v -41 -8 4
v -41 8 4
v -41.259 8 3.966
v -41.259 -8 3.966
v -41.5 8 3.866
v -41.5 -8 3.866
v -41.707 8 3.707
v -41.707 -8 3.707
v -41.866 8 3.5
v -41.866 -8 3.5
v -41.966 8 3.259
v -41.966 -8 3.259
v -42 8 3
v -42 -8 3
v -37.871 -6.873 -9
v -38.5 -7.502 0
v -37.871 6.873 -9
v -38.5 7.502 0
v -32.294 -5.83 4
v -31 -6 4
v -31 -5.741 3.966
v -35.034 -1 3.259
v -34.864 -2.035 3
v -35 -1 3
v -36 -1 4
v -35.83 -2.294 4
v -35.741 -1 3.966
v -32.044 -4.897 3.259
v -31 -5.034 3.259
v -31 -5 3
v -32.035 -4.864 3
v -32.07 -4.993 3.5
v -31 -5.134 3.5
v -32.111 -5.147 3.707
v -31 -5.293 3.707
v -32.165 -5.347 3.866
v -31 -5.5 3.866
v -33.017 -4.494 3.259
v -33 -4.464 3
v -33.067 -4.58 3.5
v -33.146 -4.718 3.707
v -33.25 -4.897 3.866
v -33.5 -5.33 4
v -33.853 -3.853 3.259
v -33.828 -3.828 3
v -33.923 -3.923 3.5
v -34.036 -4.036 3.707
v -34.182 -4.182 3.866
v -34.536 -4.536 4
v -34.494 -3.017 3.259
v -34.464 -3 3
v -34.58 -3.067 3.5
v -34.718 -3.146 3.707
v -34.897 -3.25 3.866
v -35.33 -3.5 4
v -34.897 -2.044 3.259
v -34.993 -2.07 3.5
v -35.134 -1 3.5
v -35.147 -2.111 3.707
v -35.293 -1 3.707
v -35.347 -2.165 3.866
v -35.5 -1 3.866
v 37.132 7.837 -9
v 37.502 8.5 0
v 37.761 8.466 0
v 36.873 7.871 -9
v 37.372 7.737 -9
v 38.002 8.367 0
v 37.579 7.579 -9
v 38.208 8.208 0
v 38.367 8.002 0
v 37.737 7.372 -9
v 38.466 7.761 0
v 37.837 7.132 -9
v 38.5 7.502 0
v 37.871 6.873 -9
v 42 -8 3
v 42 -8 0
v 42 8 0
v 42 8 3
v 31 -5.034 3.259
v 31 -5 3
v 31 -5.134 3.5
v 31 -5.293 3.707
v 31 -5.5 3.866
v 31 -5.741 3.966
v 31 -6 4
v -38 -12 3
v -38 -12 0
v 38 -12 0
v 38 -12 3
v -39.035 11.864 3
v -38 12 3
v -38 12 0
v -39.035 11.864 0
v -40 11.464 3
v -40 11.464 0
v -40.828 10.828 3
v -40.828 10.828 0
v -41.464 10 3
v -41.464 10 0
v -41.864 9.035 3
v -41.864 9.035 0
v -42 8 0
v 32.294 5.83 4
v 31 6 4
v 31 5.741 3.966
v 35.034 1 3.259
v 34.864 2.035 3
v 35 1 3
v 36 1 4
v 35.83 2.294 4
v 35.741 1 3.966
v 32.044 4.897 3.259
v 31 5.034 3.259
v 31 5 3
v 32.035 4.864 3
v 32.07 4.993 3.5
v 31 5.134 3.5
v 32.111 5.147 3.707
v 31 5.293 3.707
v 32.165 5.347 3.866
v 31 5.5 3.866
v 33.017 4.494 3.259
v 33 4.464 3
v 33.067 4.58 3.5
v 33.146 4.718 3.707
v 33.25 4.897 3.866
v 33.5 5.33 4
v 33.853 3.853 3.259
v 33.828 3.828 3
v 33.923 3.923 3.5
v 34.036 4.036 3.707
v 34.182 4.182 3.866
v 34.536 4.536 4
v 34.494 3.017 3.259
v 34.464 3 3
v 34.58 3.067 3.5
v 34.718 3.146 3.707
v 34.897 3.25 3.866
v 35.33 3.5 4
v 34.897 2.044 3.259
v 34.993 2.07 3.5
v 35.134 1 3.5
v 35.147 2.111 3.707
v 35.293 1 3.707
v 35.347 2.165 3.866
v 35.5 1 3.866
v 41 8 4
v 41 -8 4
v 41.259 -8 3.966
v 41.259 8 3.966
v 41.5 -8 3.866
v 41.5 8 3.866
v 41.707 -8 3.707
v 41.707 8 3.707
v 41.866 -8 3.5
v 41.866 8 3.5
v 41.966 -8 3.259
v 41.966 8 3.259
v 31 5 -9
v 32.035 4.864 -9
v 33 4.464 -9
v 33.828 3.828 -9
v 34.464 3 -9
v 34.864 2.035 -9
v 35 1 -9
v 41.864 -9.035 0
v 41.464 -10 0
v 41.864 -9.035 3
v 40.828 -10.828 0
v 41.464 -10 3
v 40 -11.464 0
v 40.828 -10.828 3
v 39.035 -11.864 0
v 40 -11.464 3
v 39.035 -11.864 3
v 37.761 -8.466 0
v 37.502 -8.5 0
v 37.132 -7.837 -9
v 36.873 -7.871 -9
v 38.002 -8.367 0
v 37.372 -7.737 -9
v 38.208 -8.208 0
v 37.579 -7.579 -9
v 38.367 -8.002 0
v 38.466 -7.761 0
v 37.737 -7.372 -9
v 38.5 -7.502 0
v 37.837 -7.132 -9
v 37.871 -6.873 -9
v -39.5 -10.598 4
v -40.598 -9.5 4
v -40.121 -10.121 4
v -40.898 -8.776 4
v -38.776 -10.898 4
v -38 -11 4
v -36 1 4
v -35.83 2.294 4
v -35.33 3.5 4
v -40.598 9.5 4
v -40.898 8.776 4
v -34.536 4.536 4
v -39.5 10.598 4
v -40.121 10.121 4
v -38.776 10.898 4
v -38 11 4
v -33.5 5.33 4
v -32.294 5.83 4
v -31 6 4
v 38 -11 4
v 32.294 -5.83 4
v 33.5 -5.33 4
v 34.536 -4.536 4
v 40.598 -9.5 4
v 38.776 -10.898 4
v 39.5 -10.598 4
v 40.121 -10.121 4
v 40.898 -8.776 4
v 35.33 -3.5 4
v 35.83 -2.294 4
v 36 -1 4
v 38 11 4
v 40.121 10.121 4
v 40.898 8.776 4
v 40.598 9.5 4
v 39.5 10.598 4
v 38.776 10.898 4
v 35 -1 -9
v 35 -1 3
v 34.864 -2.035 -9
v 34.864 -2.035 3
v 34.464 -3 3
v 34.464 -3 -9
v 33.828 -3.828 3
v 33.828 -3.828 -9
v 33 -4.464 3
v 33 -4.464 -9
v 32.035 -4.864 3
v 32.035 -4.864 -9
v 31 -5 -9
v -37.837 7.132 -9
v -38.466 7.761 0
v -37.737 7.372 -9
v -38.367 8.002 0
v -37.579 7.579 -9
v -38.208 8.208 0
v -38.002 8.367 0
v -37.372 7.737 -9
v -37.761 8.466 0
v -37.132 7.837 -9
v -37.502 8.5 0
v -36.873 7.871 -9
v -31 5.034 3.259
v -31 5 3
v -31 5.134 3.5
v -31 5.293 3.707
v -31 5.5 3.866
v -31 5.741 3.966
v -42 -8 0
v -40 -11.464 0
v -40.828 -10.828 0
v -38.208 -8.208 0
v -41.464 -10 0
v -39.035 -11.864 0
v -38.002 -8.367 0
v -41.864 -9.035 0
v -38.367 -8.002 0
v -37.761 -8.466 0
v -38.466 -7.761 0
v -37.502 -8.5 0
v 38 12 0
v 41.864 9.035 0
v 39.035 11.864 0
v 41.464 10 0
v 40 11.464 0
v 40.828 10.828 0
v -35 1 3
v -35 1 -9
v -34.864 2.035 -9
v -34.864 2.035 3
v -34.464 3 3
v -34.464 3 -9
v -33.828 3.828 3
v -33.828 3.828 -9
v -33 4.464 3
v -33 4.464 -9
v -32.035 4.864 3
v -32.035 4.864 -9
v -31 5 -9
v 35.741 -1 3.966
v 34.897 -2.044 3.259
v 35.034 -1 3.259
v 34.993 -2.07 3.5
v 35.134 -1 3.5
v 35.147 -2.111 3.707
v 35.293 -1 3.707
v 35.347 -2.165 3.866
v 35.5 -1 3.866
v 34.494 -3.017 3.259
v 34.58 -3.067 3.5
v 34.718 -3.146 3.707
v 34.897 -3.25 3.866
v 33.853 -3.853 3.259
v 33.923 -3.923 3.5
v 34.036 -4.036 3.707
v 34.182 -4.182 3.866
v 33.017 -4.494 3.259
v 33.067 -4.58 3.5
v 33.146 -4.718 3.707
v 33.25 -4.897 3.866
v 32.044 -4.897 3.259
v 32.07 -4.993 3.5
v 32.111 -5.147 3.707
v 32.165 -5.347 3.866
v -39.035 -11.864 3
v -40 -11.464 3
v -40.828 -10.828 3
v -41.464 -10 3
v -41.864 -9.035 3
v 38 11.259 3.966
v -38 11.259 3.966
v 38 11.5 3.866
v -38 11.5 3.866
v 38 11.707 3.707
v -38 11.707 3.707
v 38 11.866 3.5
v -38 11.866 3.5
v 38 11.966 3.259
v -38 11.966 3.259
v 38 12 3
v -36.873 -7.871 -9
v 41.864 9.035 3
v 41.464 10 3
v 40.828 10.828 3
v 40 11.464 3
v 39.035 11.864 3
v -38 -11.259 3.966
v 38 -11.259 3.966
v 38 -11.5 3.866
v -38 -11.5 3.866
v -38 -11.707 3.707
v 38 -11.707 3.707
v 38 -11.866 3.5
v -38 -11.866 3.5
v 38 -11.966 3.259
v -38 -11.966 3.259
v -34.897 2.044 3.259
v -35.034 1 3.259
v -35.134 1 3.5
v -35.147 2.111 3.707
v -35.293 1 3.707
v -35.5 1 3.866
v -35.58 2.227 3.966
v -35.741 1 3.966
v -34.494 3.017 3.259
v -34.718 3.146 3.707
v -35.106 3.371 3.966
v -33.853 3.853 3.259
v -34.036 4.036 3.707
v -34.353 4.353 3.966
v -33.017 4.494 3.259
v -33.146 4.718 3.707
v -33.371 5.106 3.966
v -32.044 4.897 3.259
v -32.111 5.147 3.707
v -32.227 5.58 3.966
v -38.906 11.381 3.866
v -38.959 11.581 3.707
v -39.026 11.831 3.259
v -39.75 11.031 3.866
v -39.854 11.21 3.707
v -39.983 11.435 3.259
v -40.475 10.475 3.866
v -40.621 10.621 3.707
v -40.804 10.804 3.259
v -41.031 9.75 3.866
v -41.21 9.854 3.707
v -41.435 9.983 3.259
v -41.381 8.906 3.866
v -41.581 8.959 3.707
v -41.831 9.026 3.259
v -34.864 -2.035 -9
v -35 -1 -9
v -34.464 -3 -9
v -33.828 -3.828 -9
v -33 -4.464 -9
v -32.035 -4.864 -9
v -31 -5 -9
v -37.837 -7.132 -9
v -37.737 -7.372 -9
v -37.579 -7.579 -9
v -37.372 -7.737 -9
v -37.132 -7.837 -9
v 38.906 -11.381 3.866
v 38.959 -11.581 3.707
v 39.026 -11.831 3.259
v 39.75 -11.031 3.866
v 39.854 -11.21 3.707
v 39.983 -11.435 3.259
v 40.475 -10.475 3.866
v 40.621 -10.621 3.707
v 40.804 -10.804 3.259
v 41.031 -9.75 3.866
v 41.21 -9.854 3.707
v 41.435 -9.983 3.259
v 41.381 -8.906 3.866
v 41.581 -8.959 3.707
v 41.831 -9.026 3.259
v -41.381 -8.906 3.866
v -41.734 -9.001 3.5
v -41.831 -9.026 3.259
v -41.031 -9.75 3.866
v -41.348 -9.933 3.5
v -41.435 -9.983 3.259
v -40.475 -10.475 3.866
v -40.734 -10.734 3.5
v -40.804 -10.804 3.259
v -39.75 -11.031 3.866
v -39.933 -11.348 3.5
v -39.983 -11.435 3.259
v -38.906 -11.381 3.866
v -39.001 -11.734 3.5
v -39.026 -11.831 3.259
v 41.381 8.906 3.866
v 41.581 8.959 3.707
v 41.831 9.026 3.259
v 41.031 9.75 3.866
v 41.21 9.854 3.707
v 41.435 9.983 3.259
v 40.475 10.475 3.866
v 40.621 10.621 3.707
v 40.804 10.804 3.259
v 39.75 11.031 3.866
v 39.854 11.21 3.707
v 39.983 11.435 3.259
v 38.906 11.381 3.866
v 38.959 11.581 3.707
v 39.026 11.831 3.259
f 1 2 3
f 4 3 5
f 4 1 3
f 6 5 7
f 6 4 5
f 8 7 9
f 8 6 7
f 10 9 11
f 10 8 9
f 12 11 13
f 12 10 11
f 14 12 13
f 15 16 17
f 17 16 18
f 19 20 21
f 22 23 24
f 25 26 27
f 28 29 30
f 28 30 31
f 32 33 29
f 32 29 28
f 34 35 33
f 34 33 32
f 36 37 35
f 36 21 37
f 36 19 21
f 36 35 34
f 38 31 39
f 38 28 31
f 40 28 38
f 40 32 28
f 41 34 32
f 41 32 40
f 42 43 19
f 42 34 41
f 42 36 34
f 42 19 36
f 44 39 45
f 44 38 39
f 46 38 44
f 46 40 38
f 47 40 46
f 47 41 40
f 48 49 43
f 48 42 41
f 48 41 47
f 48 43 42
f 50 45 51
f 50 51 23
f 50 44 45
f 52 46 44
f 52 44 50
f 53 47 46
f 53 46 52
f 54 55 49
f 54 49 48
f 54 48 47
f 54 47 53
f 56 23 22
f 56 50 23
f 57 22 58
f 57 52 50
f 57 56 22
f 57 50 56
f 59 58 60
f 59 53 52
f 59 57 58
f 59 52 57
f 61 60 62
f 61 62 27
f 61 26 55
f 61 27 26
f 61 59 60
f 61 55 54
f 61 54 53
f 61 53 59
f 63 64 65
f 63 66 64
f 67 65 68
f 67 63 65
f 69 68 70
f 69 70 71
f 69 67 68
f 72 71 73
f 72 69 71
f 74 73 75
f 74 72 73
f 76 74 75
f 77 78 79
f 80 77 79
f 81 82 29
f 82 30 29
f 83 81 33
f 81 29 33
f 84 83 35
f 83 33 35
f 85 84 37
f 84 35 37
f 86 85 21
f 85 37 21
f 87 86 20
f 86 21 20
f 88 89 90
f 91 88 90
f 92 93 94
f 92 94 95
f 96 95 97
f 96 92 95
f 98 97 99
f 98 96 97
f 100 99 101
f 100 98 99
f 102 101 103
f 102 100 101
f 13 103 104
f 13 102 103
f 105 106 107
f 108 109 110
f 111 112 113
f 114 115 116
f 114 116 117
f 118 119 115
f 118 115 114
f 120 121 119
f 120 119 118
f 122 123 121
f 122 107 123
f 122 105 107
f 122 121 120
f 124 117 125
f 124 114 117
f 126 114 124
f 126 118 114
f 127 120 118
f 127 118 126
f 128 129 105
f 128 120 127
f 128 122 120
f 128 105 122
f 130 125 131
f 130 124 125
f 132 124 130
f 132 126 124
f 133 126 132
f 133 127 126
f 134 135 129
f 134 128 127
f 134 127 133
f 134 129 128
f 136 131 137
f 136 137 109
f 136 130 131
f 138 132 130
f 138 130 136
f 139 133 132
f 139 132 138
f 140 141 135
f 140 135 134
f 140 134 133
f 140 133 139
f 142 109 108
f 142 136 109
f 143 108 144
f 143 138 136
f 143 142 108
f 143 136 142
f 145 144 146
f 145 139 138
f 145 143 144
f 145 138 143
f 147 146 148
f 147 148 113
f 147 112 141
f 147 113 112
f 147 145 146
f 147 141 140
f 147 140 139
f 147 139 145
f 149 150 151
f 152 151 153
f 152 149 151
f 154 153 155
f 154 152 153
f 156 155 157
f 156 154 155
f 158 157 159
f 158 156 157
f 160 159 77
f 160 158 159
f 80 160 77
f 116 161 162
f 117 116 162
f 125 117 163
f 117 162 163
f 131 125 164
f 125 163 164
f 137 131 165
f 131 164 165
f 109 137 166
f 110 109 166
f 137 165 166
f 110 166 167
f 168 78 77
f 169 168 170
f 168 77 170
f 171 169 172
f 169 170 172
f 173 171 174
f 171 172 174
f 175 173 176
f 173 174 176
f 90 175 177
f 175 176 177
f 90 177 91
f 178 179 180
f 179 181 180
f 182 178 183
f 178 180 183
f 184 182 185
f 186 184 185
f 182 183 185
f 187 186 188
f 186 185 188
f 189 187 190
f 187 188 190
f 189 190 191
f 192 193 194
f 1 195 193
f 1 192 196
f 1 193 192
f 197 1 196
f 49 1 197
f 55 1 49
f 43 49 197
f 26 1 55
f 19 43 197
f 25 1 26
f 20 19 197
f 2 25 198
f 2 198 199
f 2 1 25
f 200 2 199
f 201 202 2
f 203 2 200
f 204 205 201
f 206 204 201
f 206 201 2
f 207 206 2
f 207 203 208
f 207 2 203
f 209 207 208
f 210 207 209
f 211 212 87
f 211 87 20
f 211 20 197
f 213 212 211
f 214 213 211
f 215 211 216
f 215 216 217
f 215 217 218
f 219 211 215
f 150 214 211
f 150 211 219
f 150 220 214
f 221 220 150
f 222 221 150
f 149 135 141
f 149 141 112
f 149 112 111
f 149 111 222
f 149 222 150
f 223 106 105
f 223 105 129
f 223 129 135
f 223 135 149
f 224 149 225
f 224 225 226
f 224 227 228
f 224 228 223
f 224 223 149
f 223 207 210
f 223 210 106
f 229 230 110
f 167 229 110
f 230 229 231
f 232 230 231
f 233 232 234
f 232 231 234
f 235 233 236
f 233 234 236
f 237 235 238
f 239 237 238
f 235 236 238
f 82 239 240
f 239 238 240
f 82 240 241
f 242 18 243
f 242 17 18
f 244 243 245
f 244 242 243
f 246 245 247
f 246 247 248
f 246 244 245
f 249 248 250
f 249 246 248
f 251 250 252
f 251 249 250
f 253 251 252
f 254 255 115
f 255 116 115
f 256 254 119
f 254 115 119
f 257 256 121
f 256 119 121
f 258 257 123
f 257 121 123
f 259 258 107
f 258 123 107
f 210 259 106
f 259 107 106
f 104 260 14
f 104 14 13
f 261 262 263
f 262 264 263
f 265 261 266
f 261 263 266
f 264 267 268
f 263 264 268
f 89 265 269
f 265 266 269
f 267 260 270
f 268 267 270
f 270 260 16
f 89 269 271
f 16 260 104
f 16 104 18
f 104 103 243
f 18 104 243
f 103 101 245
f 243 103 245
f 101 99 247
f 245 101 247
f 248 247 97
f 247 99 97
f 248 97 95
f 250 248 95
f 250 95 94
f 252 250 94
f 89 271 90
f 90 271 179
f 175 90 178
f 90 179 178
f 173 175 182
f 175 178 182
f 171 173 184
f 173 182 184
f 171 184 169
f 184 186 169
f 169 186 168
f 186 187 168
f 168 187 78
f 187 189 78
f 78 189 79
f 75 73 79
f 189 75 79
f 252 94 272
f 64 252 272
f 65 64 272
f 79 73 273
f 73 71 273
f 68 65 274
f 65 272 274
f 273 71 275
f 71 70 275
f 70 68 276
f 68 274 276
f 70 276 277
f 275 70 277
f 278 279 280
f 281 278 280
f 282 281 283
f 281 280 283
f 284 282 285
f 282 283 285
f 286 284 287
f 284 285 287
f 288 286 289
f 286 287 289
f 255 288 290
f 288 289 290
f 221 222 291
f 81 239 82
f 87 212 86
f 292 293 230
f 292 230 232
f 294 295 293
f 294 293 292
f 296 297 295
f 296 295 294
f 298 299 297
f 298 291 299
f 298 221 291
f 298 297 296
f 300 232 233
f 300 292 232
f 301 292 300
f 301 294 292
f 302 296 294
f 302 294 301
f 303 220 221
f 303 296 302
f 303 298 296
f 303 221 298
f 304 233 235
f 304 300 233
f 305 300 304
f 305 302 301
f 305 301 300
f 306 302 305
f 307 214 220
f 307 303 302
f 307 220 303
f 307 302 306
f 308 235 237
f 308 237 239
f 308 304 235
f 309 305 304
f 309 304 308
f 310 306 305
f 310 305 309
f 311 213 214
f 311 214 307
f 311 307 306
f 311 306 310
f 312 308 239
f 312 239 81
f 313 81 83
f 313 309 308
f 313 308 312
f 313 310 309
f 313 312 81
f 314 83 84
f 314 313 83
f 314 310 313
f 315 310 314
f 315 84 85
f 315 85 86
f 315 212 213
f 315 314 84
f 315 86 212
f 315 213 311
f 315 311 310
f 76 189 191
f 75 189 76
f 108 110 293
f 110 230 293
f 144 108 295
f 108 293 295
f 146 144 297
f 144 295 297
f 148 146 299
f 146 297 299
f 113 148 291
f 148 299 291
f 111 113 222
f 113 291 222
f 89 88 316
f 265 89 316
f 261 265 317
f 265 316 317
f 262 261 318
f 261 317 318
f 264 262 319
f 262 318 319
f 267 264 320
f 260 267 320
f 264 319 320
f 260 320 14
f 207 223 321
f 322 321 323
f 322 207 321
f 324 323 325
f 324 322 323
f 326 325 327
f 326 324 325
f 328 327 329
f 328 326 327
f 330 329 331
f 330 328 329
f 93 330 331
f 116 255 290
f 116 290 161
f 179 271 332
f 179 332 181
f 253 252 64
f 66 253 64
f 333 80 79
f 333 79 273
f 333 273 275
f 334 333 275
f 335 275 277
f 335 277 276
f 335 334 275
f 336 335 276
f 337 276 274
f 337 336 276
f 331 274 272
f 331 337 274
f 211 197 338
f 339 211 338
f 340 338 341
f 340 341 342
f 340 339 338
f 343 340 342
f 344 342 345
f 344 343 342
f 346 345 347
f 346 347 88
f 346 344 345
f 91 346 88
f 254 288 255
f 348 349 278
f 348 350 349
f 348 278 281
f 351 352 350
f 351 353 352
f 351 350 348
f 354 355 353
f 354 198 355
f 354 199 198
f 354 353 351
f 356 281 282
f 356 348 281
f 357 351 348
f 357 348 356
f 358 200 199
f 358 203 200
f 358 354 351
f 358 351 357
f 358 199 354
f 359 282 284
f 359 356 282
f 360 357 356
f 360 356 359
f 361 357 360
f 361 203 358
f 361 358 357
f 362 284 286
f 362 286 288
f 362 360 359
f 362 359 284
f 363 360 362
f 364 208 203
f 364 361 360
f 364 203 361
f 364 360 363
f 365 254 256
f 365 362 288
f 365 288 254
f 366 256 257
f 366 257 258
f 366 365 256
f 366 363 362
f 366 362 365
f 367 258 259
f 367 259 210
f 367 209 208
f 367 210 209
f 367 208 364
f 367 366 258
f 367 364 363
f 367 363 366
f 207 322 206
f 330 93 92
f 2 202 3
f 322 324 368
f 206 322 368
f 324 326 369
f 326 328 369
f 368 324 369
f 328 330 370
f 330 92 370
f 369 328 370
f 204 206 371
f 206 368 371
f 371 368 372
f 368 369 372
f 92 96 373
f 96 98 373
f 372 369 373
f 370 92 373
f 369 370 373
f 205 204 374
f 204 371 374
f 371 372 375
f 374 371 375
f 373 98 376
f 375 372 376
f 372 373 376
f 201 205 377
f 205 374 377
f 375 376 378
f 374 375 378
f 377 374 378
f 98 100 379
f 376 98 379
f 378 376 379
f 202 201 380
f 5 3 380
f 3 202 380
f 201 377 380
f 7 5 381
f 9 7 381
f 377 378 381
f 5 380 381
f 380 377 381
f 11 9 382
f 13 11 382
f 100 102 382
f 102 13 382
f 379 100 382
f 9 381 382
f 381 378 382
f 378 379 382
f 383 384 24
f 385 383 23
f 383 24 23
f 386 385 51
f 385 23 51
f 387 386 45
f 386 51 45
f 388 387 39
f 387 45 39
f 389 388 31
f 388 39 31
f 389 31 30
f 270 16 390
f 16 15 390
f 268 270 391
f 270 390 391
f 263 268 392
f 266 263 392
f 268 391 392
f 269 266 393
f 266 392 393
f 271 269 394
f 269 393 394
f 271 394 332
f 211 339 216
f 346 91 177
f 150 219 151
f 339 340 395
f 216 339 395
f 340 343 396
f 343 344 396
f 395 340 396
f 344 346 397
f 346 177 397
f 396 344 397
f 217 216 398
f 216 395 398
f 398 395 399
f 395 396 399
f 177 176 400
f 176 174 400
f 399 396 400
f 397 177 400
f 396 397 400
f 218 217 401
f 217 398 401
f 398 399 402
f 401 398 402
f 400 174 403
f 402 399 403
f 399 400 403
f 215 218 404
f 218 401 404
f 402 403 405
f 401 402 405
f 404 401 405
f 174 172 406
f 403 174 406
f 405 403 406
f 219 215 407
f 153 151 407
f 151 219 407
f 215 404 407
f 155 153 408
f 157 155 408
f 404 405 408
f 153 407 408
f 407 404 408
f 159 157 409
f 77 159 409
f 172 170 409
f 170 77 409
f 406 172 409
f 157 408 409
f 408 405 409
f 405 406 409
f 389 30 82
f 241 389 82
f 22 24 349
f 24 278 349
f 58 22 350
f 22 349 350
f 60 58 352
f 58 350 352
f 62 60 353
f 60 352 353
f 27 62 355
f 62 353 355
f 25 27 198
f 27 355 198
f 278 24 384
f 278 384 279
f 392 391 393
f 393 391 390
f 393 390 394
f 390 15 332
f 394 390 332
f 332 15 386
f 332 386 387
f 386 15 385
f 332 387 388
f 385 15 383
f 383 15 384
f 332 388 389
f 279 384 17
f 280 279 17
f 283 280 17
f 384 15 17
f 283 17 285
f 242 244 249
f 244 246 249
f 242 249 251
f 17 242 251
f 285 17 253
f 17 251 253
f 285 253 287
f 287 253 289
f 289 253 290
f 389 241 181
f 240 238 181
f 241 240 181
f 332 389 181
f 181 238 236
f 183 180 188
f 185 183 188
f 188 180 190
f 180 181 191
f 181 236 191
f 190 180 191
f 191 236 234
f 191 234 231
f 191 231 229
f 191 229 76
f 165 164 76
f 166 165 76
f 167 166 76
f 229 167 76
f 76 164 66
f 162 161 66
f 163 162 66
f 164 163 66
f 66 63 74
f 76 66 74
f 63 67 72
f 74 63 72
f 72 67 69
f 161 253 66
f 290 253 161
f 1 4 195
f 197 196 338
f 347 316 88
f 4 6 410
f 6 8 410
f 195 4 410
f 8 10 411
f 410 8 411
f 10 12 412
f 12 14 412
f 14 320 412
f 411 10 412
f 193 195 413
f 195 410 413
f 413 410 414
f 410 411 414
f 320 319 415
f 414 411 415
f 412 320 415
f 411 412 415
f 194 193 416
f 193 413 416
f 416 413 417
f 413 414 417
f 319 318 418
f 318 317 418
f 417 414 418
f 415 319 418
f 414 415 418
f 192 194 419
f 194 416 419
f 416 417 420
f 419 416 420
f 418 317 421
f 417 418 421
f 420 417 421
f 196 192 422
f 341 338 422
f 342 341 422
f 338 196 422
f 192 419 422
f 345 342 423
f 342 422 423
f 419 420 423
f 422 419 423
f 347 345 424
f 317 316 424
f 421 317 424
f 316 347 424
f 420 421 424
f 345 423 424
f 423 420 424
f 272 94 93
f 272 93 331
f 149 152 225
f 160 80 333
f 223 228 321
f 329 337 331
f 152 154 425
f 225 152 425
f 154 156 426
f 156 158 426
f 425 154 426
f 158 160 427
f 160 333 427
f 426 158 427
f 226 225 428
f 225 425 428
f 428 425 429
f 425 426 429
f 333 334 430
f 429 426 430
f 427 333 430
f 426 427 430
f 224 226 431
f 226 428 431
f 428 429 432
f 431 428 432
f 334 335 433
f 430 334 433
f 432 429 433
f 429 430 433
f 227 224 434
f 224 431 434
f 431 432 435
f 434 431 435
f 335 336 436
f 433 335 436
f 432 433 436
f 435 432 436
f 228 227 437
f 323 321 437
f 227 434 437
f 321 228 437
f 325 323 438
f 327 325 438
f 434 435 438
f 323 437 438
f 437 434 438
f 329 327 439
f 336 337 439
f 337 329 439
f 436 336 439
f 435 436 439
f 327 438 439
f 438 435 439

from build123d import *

# Parameters (mm, degrees)
SKETCH2_W           = 84
SKETCH2_H           = 24
SKETCH2_W_2         = 70
SKETCH2_H_2         = 10
BOSS_EXTRUDE1_DEPTH = 4
SKETCH3_W           = 77
SKETCH3_H           = 17
SKETCH3_W_2         = 70
SKETCH3_H_2         = 10
BOSS_EXTRUDE2_DEPTH = 9
DRAFT2_ANGLE        = 4
FILLET2_R           = 4
FILLET1_R           = 1
FILLET3_R           = 1


with BuildPart() as part:
    # Sketch2 → Boss-Extrude1 (new body)
    with BuildSketch(Plane.XY):
        Rectangle(SKETCH2_W, SKETCH2_H)
        Rectangle(SKETCH2_W_2, SKETCH2_H_2, mode=Mode.SUBTRACT)
    extrude(amount=BOSS_EXTRUDE1_DEPTH)

    # Sketch3 → Boss-Extrude2 (add)
    with BuildSketch(Plane.XY):
        Rectangle(SKETCH3_W, SKETCH3_H)
        Rectangle(SKETCH3_W_2, SKETCH3_H_2, mode=Mode.SUBTRACT)
    extrude(amount=-BOSS_EXTRUDE2_DEPTH)

    # Draft2
    draft2_faces = [part.faces().sort_by_distance(p)[0] for p in [
        (0, 8.5, -4.5),
        (-38.5, 0, -4.5),
        (38.5, 0, -4.5),
        (0, -8.5, -4.5),
    ]]
    draft(draft2_faces, Plane(origin=(0, 0, 0), x_dir=(-1, 0, 0), z_dir=(0, 0, -1)), DRAFT2_ANGLE)

    # Fillet2
    fillet2_edges = [part.edges().sort_by_distance(p)[0] for p in [
        (35, -5, -2.5),
        (35, 5, -2.5),
        (-35, 5, -2.5),
        (-35, -5, -2.5),
        (42, -12, 2),
        (-42, -12, 2),
        (-42, 12, 2),
        (42, 12, 2),
    ]]
    fillet(fillet2_edges, radius=FILLET2_R)

    # Fillet1
    fillet1_edges = [part.edges().sort_by_distance(p)[0] for p in [
        (0, -12, 4),
        (-42, 0, 4),
        (42, 0, 4),
        (0, 12, 4),
        (0, 5, 4),
        (35, 0, 4),
        (0, -5, 4),
        (-35, 0, 4),
        (40.828427125, -10.828427125, 4),
        (40.828427125, 10.828427125, 4),
        (-40.828427125, 10.828427125, 4),
        (-40.828427125, -10.828427125, 4),
        (33.828427125, 3.828427125, 4),
        (-33.828427125, 3.828427125, 4),
        (-33.828427125, -3.828427125, 4),
        (33.828427125, -3.828427125, 4),
    ]]
    fillet(fillet1_edges, radius=FILLET1_R)

    # Fillet3
    fillet3_edges = [part.edges().sort_by_distance(p)[0] for p in [
        (-38.185329346, -8.185329346, -4.5),
        (-38.185329346, 8.185329346, -4.5),
        (38.185329346, 8.185329346, -4.5),
        (38.185329346, -8.185329346, -4.5),
    ]]
    fillet(fillet3_edges, radius=FILLET3_R)


solid = part.part
